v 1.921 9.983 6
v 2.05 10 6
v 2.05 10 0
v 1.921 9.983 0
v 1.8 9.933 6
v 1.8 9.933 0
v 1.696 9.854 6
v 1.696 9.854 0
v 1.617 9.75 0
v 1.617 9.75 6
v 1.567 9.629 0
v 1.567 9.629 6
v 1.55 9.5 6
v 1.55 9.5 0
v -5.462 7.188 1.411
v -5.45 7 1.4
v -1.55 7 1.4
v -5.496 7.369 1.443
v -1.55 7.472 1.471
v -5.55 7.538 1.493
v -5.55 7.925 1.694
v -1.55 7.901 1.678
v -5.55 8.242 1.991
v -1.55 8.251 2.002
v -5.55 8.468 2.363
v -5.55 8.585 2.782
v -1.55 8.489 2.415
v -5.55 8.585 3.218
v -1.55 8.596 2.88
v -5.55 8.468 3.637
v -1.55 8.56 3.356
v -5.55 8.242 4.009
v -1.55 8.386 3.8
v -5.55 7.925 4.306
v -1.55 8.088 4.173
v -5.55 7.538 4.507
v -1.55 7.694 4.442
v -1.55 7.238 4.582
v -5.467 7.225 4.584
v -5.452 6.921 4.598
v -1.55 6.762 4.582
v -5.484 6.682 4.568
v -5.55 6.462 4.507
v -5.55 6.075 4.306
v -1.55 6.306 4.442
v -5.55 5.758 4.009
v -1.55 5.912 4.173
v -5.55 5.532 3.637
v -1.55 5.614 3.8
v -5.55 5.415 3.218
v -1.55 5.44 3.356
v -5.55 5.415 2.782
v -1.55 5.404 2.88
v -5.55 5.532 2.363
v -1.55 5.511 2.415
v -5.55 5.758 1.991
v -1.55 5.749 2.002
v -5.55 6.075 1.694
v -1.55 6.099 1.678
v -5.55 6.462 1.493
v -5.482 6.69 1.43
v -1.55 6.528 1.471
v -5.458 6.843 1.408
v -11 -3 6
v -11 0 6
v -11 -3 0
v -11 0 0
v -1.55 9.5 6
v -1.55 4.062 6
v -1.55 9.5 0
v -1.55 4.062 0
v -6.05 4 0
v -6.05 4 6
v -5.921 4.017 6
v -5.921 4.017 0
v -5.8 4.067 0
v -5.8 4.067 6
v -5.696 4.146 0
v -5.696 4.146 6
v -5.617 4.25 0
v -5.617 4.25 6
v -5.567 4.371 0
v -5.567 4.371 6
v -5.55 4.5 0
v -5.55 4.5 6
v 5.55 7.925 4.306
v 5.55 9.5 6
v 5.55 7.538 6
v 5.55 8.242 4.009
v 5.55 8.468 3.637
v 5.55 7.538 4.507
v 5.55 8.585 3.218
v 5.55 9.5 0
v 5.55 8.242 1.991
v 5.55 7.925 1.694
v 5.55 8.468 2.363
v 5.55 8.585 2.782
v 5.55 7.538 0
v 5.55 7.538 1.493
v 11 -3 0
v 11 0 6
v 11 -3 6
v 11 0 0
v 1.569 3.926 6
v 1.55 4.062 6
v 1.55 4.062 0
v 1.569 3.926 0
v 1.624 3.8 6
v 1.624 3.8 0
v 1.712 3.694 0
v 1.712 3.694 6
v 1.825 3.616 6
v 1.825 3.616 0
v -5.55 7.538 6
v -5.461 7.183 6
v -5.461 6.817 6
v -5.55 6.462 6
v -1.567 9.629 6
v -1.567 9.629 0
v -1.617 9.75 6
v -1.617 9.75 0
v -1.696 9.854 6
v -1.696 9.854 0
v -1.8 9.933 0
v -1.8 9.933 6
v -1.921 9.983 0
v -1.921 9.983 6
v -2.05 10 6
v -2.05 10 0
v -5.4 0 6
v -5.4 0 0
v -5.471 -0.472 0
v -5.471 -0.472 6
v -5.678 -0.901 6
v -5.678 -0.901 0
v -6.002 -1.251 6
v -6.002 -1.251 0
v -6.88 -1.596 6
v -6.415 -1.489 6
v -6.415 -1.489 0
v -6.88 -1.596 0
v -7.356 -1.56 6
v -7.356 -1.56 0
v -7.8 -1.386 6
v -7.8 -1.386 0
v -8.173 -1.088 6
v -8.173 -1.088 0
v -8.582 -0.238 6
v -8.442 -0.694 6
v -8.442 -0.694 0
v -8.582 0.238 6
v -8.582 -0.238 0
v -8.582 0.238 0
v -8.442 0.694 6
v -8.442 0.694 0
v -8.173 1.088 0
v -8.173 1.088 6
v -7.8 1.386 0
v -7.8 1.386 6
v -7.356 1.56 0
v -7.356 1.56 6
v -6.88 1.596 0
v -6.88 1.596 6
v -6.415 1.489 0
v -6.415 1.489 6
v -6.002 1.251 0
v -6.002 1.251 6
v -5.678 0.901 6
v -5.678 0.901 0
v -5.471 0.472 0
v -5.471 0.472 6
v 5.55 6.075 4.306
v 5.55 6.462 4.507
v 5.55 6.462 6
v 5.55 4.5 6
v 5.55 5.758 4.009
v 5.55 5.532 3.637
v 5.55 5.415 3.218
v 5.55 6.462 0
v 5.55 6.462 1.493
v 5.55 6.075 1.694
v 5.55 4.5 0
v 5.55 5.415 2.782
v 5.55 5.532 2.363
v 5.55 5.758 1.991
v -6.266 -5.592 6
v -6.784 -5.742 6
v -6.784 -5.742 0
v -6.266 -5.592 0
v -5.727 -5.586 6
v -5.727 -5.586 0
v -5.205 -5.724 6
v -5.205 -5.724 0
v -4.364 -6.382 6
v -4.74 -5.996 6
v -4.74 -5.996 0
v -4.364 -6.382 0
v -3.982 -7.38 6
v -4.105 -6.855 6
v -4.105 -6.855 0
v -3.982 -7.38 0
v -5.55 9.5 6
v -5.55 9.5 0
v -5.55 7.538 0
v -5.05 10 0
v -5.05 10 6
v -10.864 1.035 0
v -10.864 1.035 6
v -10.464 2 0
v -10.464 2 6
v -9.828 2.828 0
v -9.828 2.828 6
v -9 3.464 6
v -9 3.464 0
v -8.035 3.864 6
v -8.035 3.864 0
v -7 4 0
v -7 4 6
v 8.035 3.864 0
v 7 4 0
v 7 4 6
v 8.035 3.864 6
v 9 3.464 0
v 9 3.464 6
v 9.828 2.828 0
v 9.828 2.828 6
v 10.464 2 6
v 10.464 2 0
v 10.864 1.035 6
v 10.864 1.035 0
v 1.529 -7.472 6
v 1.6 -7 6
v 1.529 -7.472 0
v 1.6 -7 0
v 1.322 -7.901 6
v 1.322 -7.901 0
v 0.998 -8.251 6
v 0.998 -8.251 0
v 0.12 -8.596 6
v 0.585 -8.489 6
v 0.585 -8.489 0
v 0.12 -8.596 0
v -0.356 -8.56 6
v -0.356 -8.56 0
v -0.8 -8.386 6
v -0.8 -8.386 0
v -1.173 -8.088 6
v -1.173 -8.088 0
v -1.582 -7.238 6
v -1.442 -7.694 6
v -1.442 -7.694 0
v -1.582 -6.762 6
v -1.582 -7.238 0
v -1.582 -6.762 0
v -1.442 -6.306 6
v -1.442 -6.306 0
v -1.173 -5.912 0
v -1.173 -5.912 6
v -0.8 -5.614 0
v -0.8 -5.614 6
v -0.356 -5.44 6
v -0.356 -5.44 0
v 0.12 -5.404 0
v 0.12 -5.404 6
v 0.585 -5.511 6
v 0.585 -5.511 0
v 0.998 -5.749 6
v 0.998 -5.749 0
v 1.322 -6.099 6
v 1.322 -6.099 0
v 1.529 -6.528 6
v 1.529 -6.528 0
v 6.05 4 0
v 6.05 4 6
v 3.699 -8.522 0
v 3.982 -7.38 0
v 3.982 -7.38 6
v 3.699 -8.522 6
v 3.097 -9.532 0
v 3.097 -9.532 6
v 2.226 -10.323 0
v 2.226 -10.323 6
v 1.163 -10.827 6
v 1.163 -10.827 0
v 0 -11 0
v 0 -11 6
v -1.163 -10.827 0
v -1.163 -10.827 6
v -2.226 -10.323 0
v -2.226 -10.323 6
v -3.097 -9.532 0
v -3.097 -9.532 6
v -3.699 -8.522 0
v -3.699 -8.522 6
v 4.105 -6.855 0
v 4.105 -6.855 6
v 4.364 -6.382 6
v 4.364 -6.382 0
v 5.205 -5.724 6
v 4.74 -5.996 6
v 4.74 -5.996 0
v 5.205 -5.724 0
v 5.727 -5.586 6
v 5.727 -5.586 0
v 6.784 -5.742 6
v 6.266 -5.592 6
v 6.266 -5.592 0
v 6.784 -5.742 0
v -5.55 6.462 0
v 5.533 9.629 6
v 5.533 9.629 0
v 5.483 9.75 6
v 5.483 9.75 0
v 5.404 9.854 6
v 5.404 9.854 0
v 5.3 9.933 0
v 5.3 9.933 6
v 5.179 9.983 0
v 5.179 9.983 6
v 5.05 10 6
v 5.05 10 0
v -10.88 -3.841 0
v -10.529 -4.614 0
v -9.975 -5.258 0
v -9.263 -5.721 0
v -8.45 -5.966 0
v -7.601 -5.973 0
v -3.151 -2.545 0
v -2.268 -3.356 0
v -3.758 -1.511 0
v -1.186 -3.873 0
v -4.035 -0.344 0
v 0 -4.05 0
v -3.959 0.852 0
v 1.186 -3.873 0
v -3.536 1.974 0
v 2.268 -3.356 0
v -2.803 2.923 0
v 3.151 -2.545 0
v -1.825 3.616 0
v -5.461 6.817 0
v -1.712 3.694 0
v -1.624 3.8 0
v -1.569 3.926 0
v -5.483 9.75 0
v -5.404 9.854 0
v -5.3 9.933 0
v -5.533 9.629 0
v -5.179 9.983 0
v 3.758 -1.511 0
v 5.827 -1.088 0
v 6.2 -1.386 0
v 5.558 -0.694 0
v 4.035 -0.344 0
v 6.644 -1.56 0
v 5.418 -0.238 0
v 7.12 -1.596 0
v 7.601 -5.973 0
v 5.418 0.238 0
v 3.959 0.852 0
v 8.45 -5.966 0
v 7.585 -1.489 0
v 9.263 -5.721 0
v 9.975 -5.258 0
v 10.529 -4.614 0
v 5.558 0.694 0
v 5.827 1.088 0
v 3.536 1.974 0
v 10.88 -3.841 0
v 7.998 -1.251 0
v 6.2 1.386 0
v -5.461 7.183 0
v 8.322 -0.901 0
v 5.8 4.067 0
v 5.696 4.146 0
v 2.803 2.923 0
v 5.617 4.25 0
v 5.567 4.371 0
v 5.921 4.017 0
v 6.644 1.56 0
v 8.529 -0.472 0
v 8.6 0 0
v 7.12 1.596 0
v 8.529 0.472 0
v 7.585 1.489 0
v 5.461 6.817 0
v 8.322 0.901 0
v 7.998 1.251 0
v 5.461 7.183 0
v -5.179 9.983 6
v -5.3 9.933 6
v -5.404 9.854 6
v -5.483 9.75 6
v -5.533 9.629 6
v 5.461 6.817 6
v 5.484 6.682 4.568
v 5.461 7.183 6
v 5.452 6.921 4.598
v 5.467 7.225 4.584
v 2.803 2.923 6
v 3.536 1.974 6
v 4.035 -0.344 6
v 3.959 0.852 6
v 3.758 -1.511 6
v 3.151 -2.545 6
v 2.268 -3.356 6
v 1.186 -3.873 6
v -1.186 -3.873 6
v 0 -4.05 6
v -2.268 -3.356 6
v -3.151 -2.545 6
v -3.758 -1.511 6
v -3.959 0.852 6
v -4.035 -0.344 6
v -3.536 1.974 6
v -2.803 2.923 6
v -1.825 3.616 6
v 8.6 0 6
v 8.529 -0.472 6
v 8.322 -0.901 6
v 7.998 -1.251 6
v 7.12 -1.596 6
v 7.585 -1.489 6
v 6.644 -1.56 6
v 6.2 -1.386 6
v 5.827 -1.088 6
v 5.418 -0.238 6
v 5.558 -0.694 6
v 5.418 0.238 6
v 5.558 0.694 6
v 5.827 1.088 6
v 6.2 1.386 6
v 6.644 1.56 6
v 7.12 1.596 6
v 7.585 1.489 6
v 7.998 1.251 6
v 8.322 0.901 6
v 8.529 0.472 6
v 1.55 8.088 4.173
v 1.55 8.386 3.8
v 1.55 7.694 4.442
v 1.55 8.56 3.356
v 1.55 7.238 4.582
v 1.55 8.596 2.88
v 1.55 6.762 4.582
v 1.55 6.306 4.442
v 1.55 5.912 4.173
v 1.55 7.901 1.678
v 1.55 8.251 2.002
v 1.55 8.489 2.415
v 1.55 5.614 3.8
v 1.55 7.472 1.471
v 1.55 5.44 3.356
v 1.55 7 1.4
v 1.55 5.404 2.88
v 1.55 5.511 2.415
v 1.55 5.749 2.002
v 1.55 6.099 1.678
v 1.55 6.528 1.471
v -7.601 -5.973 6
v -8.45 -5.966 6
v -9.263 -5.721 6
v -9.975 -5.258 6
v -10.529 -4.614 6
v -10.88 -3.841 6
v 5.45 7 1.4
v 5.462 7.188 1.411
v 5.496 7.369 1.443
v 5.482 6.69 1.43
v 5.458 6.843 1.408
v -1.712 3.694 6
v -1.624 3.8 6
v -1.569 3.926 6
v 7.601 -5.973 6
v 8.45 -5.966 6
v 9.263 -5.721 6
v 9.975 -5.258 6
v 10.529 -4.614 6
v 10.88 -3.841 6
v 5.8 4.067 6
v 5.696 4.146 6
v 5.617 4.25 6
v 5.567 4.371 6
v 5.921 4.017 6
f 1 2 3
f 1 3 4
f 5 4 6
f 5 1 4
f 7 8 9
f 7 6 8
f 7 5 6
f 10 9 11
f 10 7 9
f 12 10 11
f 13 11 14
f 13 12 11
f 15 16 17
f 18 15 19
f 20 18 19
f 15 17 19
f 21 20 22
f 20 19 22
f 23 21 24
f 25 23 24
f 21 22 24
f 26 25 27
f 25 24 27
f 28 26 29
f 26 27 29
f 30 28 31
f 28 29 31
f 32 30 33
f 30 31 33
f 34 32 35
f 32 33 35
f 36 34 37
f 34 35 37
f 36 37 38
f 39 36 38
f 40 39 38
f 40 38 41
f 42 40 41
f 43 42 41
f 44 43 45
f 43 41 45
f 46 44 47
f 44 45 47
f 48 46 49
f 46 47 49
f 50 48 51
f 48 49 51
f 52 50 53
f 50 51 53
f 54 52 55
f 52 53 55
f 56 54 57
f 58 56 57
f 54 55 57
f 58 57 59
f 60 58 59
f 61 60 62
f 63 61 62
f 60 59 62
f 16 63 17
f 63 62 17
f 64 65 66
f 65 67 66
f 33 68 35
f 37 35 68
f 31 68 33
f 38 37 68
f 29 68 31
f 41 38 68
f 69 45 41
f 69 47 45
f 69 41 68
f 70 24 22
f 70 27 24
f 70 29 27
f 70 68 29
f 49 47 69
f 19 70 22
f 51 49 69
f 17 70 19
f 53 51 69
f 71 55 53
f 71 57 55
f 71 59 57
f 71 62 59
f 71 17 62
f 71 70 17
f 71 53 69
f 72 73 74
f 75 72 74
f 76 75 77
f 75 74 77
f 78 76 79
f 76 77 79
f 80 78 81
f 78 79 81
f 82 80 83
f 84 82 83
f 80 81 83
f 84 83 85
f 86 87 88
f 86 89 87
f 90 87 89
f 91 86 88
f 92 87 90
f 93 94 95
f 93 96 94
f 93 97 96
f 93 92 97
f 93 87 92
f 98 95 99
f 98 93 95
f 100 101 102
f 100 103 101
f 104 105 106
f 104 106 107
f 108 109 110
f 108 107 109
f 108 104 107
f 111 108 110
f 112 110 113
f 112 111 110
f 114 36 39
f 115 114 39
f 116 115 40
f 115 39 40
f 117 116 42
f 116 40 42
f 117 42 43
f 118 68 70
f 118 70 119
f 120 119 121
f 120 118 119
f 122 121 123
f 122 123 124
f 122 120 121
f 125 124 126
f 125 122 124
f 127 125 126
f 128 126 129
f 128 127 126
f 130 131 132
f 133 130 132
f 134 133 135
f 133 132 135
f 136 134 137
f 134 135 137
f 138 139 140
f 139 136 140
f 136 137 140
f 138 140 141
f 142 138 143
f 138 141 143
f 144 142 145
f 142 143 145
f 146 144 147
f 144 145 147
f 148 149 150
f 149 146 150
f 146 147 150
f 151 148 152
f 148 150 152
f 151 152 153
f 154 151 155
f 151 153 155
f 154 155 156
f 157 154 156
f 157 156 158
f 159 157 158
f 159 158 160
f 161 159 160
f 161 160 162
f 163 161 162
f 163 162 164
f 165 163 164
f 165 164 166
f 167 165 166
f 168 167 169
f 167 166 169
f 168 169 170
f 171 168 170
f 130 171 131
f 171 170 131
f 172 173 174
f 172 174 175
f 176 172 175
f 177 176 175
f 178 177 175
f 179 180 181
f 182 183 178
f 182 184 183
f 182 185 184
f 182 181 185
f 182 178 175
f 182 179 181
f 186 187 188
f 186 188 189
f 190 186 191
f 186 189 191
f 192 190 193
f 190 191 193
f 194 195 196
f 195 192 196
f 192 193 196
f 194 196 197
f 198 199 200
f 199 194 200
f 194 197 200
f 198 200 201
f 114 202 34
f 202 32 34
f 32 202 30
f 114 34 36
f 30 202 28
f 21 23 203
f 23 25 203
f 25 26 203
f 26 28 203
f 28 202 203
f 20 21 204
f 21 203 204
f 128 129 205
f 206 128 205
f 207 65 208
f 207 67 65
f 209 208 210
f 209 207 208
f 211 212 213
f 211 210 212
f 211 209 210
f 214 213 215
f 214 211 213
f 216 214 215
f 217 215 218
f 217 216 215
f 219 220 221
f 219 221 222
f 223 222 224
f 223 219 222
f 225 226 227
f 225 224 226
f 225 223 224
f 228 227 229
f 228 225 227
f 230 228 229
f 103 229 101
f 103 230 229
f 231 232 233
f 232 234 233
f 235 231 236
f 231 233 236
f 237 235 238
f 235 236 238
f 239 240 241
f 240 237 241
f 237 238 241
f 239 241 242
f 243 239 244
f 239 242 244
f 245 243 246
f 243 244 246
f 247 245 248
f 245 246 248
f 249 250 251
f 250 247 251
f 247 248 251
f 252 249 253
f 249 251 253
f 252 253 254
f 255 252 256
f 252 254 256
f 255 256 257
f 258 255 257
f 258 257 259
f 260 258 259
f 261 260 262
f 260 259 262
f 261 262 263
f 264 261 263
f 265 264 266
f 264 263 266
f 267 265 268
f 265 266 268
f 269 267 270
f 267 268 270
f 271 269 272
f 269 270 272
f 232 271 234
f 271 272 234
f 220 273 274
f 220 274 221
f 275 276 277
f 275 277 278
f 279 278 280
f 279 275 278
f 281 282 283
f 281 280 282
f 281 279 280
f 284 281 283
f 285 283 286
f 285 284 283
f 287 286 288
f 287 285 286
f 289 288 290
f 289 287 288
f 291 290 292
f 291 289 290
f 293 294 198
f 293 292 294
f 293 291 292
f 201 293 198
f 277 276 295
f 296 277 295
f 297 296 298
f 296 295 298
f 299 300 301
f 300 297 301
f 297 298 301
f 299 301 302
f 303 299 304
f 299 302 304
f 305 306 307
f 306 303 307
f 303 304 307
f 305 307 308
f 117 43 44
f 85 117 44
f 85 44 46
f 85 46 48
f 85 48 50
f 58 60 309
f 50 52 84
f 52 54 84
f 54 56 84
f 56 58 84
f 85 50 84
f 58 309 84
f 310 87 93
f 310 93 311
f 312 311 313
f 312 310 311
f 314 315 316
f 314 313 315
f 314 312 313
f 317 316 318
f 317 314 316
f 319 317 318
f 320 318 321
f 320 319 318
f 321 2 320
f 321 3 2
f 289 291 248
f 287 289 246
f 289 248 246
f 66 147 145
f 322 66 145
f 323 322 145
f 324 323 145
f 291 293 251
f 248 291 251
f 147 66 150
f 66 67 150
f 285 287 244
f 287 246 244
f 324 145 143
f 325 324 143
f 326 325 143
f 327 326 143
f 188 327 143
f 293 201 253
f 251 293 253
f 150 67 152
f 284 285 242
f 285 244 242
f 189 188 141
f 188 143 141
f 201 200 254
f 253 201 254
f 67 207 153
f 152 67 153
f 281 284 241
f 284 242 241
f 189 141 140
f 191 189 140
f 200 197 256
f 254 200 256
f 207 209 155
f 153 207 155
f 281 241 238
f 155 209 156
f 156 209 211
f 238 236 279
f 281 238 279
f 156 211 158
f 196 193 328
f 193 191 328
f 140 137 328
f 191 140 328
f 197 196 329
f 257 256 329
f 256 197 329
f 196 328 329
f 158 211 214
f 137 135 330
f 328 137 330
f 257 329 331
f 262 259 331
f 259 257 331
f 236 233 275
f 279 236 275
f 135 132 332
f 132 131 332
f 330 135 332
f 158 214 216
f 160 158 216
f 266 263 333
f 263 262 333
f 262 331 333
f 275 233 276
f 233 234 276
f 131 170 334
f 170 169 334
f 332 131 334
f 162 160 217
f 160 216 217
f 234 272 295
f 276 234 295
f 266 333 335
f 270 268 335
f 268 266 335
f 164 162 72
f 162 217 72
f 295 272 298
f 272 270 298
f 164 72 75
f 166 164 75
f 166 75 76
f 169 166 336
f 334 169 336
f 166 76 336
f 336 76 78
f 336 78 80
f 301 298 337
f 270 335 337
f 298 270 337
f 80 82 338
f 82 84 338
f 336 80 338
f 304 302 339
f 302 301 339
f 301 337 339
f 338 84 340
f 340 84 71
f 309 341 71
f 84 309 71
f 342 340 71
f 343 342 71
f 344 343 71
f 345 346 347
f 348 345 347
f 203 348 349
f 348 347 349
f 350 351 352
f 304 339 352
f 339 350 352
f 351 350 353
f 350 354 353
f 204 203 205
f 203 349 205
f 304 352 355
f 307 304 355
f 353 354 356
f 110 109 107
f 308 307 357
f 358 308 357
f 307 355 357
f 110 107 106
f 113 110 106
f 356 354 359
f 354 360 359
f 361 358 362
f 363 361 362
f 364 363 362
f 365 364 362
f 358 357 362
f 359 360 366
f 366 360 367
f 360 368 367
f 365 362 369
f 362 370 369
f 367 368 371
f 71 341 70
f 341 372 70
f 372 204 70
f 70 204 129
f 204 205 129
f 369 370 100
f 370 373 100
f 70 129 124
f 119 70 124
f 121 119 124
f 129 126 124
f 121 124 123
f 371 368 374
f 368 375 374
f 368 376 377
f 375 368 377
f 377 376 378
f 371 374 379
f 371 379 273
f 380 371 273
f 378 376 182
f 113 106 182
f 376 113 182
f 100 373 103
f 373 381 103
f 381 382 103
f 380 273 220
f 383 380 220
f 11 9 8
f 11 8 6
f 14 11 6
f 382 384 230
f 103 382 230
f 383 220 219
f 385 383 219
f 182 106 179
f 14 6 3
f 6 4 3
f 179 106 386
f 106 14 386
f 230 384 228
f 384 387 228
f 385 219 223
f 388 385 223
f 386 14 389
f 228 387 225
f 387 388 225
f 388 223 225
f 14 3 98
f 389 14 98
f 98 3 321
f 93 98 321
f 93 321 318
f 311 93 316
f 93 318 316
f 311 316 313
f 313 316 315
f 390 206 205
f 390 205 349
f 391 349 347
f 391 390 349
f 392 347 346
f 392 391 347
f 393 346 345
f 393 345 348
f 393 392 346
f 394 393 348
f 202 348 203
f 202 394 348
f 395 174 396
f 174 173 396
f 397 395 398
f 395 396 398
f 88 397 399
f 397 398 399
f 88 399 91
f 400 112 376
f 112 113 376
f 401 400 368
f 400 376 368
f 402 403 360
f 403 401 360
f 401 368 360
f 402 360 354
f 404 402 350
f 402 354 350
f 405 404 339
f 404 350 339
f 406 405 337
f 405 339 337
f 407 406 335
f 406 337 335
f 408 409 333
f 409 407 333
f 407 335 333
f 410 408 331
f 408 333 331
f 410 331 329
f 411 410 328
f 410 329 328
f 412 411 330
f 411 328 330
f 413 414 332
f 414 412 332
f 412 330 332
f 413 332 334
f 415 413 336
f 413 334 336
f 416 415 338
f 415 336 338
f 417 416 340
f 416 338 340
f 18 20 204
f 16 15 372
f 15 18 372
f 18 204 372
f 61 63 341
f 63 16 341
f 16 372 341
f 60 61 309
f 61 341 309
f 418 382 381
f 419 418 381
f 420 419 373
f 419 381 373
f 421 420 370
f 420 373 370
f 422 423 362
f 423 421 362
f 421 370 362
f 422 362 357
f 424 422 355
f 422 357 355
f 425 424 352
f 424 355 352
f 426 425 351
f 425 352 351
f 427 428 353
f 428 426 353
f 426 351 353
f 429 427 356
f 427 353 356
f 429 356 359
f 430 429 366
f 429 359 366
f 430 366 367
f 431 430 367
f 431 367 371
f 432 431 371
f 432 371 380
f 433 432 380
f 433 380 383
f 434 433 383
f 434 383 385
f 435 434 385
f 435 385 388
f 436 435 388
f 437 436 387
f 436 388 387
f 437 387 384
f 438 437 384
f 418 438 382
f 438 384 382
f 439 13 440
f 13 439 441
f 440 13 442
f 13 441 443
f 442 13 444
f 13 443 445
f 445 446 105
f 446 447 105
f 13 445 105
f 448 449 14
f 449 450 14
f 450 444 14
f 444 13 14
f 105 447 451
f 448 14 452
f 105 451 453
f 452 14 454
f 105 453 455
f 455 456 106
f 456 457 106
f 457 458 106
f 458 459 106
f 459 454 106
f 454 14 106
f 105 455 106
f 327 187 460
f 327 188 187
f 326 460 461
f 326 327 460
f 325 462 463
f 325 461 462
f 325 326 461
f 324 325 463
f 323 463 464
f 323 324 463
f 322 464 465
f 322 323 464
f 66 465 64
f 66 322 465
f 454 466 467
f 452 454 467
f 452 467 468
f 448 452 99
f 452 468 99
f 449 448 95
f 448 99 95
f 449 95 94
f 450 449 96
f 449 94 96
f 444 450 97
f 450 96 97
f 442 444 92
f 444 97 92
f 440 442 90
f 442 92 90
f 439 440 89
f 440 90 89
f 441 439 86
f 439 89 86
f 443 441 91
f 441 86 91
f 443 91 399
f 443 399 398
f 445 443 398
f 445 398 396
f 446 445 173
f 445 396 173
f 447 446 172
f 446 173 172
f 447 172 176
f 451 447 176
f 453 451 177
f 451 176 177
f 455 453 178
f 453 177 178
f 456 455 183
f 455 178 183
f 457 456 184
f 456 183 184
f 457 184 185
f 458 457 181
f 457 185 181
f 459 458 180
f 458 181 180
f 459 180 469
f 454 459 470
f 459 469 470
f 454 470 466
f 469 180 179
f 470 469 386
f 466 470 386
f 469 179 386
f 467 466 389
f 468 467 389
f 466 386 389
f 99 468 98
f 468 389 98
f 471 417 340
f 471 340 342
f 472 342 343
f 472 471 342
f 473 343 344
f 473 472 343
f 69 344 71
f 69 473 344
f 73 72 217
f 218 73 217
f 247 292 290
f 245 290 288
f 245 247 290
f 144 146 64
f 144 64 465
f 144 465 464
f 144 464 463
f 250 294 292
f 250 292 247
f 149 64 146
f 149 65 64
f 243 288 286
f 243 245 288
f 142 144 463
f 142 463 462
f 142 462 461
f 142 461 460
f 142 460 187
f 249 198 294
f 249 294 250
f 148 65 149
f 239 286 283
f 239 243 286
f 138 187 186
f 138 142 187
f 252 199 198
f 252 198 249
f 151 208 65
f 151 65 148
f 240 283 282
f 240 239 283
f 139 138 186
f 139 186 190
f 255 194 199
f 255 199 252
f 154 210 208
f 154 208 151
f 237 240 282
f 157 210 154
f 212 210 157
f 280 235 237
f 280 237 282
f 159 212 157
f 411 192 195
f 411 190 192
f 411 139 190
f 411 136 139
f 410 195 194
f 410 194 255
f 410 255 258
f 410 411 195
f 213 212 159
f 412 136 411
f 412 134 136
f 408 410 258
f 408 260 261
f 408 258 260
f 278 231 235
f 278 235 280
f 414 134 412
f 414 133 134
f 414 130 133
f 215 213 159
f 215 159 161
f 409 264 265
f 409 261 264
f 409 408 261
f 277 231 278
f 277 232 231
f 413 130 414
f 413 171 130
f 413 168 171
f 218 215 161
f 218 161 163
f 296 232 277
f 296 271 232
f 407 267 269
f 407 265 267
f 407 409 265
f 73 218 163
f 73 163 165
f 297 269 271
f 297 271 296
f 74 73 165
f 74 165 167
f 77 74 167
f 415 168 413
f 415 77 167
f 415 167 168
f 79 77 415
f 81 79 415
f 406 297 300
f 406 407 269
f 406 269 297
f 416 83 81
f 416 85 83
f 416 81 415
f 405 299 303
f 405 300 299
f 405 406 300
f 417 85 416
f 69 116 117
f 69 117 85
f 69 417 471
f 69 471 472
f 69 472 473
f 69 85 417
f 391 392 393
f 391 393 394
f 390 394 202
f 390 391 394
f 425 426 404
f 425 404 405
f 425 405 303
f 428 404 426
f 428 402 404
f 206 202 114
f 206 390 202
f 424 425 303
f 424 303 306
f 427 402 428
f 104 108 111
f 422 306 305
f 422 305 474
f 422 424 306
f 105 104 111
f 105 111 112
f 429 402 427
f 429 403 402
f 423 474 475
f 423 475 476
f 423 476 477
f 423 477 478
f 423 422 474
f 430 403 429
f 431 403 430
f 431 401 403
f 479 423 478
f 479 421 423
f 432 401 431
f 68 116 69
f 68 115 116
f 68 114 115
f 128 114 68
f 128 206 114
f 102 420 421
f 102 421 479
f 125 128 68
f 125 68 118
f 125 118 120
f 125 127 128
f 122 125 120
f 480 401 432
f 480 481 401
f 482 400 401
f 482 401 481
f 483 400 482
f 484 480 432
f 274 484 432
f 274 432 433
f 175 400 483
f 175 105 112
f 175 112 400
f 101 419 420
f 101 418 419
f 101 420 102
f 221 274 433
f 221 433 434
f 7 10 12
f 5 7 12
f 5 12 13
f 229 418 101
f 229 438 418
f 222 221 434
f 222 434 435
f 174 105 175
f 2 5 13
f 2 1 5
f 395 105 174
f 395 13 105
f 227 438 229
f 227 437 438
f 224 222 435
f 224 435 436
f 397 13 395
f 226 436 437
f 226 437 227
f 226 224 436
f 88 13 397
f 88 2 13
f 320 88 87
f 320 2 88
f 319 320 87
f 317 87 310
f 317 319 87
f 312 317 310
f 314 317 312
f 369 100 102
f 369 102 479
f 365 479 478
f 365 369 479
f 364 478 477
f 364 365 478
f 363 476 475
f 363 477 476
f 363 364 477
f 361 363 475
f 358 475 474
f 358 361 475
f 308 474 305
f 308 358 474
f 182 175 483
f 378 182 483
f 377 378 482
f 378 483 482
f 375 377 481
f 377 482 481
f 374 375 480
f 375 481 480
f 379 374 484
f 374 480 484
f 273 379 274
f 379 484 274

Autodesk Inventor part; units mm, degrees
ref_plane "YZ Plane" through (0, 0, 0) normal (1, 0, 0) x (0, 1, 0)
ref_plane "XZ Plane" through (0, 0, 0) normal (0, 1, 0) x (-1, 0, 0)
ref_plane "XY Plane" through (0, 0, 0) normal (0, 0, 1) x (1, 0, 0)
sketch "スケッチ1" plane through (0, 0, 0) normal (0, 0, 1) x (1, 0, 0)
  arc A0 (-1.55, 3.7417) -> (1.55, 3.7417) centre (0, 0) ccw
  circle A1 centre (-7, 0) radius 1.6
  circle A2 centre (7, 0) radius 1.6
  arc A3 (-7, 4) -> (-11, 0) centre (-7, 0) ccw
  arc A4 (11, 0) -> (7, 4) centre (7, 0) ccw
  line L0 (-1.55, 10) -> (-1.55, 3.7417)
  line L1 (1.55, 10) -> (1.55, 3.7417)
  circle A5 centre (0, -7) radius 1.6
  line L2 (1.55, 10) -> (5.55, 10)
  line L3 (5.55, 10) -> (5.55, 7.5385)
  line L4 (5.55, 4) -> (7, 4)
  line L5 (-1.55, 10) -> (-5.55, 10)
  line L6 (-5.55, 10) -> (-5.55, 7.5385)
  line L7 (-5.55, 4) -> (-7, 4)
  line L8 (-11, 0) -> (-11, -3)
  arc A6 (-11, -3) -> (-6.7837, -5.7424) centre (-8, -3) ccw
  arc A7 (1.55, 3.7417) -> (-1.55, 3.7417) centre (0, 0) ccw construction
  arc A8 (-3.9819, -7.3804) -> (3.9819, -7.3804) centre (0, -7) ccw
  arc A9 (-3.9819, -7.3804) -> (-6.7837, -5.7424) centre (-5.9728, -7.5706) ccw
  line L9 (11, 0) -> (11, -3)
  arc A10 (6.7837, -5.7424) -> (11, -3) centre (8, -3) ccw
  arc A11 (6.7837, -5.7424) -> (3.9819, -7.3804) centre (5.9728, -7.5706) ccw
  arc A12 (-5.55, 7.5385) -> (-5.55, 6.4615) centre (-6.95, 7) ccw construction
  arc A13 (5.55, 6.4615) -> (5.55, 7.5385) centre (6.95, 7) ccw construction
  arc A14 (-5.55, 6.4615) -> (-5.55, 7.5385) centre (-6.95, 7) ccw
  arc A15 (5.55, 7.5385) -> (5.55, 6.4615) centre (6.95, 7) ccw
  line L10 (5.55, 6.4615) -> (5.55, 4)
  line L11 (5.55, 7.5385) -> (5.55, 6.4615) construction
  line L12 (-5.55, 6.4615) -> (-5.55, 4)
  line L13 (-5.55, 7.5385) -> (-5.55, 6.4615) construction
  dimension "d0" = 8.1
  dimension "d1" = 3.2
  dimension "d2" = 3.2
  dimension "d4" = 7
  dimension "d5" = 7
  dimension "d6" = 3.2
  dimension "d7" = 7
  dimension "d8" = 6
  dimension "d9" = 4
  dimension "d10" = 3.1
  dimension "d11" = 4
  dimension "d12" = 4
  dimension "d13" = 1.55
  dimension "d14" = 3
  dimension "d15" = 3
  dimension "d16" = 4
  dimension "d17" = 4
  dimension "d18" = 3
  dimension "d19" = 3
  dimension "d20" = 2
  dimension "d21" = 2
  dimension "d22" = 3
  dimension "d23" = 3
  dimension "d24" = 1.4
  dimension "d25" = 1.4
  dimension "d26" = 3
  dimension "d27" = 3
extrude "押し出し1" add sketch "スケッチ1" along normal blind 6
sketch "スケッチ2" plane through (5.55, 4, 0) normal (1, 0, 0) x (0, 0, -1)
  circle A0 centre (-3, 3) radius 1.6
  line L0 (0, 6) -> (-6, 6) projected
  point P0 (0, -4)
  dimension "d30" = 3.2
  dimension "d31" = 3
  dimension "d32" = 3
extrude "押し出し2" cut sketch "スケッチ2" against normal through all
fillet "フィレット1" radius 0.5 8 edges at (-5.55, 10, 3) (-1.55, 10, 3) (1.55, 10, 3) (5.55, 10, 3) (5.55, 4, 3) (-5.55, 4, 3) (-1.55, 3.7417, 3) (1.55, 3.7417, 3)
properties part number "カップリング_軸8mm"
